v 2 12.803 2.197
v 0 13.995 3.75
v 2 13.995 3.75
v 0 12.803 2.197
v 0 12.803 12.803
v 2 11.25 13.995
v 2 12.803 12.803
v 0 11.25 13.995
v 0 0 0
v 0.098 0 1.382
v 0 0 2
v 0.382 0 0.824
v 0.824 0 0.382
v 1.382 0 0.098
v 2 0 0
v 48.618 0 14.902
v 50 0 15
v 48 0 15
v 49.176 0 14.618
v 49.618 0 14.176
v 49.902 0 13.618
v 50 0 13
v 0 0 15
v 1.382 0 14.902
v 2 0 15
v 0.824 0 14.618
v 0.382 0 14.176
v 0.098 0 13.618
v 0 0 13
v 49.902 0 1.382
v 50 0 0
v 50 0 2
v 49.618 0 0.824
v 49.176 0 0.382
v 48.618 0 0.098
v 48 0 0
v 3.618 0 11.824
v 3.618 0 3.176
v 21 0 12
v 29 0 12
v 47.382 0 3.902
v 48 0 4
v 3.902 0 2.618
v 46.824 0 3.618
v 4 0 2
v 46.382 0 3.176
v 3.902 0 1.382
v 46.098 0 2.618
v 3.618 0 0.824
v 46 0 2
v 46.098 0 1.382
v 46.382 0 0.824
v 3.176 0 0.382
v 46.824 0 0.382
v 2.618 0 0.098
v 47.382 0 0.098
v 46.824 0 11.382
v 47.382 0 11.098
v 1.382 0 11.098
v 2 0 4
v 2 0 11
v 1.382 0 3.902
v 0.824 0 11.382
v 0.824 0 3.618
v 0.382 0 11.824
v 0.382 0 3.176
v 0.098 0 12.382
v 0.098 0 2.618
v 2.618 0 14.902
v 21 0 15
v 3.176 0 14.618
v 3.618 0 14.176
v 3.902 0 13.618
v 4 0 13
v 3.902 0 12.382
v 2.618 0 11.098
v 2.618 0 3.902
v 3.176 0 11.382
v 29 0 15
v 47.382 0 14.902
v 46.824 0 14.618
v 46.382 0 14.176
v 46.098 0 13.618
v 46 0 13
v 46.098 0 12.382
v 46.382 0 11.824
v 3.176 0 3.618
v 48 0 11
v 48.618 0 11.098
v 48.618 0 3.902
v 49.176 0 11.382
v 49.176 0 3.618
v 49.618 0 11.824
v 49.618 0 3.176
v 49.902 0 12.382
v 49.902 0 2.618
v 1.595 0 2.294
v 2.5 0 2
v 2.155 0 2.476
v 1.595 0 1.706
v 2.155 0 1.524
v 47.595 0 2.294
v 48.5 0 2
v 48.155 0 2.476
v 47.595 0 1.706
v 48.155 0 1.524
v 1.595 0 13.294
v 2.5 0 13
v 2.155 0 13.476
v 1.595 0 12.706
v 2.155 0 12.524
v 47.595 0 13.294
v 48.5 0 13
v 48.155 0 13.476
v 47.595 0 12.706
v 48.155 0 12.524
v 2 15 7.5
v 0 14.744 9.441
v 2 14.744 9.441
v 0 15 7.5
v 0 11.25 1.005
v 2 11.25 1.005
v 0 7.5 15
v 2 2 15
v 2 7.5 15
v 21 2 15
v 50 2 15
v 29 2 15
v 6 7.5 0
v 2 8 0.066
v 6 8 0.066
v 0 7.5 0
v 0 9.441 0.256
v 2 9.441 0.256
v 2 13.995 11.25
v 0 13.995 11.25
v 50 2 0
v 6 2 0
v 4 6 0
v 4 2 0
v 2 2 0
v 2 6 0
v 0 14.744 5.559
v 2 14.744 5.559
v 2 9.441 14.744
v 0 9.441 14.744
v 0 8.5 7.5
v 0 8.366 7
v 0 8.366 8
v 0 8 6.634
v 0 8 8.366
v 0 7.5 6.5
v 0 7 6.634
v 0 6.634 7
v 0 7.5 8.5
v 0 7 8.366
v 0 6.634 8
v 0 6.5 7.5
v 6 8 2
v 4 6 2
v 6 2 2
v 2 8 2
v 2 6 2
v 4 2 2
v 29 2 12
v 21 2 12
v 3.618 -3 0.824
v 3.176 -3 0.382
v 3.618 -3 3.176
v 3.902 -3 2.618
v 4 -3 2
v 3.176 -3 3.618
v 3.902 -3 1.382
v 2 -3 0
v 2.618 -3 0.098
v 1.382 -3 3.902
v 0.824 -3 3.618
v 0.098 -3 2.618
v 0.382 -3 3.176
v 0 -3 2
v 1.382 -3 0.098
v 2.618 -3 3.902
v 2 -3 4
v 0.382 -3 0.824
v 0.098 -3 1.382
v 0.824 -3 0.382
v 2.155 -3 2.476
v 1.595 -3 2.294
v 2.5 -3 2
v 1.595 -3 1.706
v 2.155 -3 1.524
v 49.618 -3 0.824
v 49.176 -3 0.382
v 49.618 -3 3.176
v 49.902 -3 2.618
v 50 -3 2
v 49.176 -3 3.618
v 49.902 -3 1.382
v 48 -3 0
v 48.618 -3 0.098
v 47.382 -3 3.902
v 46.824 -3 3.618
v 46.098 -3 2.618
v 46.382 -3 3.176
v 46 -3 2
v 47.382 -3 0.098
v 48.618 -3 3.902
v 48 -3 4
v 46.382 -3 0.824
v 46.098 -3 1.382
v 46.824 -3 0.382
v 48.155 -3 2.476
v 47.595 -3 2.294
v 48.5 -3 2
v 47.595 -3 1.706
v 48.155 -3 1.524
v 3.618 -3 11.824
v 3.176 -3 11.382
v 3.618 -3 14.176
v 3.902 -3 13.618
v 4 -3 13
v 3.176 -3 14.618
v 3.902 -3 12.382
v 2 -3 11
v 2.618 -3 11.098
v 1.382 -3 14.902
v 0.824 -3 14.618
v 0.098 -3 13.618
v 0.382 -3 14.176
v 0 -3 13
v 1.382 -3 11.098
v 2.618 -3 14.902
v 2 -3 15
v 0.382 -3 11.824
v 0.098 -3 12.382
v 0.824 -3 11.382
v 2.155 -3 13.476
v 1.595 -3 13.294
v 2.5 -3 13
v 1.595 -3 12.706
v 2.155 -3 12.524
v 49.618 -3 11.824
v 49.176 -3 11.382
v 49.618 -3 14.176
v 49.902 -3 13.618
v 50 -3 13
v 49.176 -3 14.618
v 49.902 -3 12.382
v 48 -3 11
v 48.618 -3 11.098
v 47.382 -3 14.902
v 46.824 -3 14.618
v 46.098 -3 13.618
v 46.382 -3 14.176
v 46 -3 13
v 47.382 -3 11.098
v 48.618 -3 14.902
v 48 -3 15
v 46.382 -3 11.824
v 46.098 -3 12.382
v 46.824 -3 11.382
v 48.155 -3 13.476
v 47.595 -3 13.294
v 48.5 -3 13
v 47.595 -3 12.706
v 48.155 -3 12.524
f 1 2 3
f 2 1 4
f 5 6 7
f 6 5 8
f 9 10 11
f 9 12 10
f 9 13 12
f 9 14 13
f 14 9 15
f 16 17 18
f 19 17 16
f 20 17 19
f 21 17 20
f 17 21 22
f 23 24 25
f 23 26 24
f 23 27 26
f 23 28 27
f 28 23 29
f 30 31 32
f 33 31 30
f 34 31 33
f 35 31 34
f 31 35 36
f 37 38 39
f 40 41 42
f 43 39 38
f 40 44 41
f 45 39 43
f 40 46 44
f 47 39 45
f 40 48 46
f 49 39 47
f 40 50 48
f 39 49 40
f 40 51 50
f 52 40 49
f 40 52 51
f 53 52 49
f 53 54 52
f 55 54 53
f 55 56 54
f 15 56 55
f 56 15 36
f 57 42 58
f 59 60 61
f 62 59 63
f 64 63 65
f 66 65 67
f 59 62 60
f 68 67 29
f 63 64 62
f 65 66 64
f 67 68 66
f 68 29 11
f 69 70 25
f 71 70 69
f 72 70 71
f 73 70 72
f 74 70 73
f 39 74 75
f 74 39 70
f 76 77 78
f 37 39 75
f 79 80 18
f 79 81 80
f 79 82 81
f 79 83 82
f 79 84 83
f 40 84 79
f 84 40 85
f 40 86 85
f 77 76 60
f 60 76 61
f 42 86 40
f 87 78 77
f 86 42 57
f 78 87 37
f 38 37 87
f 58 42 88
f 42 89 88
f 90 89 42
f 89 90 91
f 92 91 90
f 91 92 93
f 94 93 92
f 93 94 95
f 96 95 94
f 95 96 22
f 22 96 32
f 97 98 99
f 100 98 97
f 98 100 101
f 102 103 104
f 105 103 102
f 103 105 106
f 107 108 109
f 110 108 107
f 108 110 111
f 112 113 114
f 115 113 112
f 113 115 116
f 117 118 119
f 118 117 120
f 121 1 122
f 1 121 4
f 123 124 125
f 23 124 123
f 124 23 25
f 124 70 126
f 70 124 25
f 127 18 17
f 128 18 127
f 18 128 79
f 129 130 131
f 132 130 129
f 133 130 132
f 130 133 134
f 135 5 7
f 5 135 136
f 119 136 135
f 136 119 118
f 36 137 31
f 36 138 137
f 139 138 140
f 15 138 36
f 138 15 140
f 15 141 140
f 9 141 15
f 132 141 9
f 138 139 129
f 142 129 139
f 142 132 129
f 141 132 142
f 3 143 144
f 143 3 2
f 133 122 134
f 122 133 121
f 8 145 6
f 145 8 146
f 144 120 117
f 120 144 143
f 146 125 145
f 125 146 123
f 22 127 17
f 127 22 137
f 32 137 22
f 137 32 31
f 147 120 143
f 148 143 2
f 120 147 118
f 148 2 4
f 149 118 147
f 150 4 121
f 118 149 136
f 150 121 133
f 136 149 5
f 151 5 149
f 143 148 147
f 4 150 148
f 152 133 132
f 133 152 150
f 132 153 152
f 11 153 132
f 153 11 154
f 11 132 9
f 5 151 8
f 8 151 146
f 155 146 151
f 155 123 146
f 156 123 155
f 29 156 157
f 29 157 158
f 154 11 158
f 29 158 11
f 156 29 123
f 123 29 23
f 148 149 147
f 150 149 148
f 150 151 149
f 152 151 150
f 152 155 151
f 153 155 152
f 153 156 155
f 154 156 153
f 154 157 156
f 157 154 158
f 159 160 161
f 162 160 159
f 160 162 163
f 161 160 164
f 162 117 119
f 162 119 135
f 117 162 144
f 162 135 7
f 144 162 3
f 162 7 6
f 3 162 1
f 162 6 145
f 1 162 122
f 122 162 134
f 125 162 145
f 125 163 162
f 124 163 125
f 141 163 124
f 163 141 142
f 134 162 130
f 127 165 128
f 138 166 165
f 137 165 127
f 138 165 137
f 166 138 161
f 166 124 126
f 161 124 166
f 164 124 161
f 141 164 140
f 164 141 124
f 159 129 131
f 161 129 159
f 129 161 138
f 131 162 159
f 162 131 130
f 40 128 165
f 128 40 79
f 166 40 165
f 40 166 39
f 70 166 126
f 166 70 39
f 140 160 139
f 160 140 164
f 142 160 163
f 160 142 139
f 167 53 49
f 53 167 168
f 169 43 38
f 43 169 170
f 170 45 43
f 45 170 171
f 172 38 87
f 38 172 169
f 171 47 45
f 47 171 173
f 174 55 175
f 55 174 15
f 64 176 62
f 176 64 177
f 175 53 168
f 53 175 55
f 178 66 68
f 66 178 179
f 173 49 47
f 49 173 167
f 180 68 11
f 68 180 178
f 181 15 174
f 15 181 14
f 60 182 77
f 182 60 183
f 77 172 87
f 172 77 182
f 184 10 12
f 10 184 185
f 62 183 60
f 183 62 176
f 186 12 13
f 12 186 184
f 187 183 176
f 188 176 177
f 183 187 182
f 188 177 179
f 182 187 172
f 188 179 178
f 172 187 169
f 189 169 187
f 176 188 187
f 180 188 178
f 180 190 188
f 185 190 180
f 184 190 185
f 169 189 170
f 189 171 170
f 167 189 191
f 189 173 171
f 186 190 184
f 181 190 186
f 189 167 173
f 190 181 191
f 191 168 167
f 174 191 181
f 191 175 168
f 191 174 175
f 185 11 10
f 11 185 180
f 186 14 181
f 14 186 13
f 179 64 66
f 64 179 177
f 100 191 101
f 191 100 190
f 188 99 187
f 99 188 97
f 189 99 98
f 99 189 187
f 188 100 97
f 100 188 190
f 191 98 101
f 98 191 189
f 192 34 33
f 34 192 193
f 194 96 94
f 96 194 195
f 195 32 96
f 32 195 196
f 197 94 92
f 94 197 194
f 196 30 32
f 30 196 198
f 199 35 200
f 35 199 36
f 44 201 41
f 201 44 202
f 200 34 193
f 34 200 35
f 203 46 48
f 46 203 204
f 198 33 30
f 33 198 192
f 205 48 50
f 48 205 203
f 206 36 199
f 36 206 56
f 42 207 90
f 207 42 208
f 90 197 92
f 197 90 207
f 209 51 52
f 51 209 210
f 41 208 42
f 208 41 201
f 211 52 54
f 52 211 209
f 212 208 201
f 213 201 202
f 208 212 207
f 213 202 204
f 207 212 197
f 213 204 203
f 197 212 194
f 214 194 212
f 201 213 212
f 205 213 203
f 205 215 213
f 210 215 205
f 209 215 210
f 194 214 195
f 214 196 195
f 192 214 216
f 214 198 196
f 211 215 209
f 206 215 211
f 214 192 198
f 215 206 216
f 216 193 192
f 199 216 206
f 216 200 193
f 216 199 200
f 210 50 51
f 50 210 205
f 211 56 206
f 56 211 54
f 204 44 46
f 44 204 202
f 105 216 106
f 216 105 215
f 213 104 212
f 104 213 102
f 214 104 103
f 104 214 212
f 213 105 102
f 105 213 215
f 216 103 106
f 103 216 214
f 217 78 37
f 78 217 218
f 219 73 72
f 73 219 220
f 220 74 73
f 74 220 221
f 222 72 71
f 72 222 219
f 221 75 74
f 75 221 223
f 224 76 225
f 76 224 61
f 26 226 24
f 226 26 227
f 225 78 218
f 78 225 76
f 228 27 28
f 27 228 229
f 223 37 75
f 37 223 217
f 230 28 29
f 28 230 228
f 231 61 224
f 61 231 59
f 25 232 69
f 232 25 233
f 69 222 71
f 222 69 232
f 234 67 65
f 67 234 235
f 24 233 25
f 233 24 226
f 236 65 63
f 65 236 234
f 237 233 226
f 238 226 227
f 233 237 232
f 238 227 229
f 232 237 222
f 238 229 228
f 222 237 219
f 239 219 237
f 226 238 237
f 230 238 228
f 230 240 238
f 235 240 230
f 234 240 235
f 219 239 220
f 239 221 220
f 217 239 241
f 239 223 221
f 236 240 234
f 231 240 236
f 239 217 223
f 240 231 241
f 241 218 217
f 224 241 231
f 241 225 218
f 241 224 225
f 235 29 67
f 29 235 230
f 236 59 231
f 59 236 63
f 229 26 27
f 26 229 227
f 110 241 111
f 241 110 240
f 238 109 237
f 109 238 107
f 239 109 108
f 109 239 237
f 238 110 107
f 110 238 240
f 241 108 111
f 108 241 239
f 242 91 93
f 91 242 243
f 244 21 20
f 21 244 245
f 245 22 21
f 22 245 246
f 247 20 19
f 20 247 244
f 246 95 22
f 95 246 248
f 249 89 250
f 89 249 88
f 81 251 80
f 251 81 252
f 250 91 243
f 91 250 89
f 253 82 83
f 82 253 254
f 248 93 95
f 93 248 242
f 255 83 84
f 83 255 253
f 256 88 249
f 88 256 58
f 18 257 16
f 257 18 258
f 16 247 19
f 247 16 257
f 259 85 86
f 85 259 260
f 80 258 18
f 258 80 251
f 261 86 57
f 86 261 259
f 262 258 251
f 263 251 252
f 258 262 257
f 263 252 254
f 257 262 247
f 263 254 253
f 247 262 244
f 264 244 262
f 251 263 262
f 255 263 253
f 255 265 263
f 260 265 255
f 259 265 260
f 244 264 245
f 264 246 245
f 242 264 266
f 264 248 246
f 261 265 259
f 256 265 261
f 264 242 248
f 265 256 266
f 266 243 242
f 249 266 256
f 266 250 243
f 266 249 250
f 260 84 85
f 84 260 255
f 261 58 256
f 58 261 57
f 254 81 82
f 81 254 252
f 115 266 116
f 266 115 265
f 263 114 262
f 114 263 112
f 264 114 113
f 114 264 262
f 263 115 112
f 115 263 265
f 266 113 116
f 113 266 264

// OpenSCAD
h_bracket = 15;
l_bracket = 50;
r = h_bracket/2;
r_clearance = 1;
r_pilot = r_clearance/2;
r_standoff = r_pilot*4;

dx_standoff = 2;
dz_standoff = 2;

hole_offset = 2;
h_notch = 3;
w_notch = 8;
thickness = 2;

union() {
  difference() {
    hull() {
      cube([l_bracket, r, r*2]);
      translate([0, r, r]) {
        rotate([0, 90, 0]) {
          cylinder(l_bracket, r = r);
        }
      }
    }
    translate([thickness, thickness, thickness]) {
      cube([l_bracket, r*2, r*2]);
    }
    translate([thickness*3, thickness, -r]) {
      cube([l_bracket, r*2, r*2]);
    }
    translate([thickness, thickness*4, -r]) {
      cube([l_bracket, r*2, r*2]);
    }
    translate([-thickness, r, r]) {
      rotate([0, 90, 0]) {
        cylinder(thickness, r = r_clearance, $fn = 12);
      }
    }
    translate([l_bracket/2, thickness/2, h_bracket]) {
      cube([w_notch, thickness*2, h_notch*2], center = true);
    }
    translate([thickness, thickness, -thickness/2]) {
      cube([thickness, thickness*2, thickness*2]);
    }
  }
  translate([dx_standoff, thickness/2, dz_standoff]) {
    standoff();
  }
  translate([l_bracket-dx_standoff, thickness/2, dz_standoff]) {
    standoff();
  }
  translate([dx_standoff, thickness/2, h_bracket-dz_standoff]) {
    standoff();
  }
  translate([l_bracket-dx_standoff, thickness/2, h_bracket-dz_standoff]) {
    standoff();
  }
}

module standoff() {
  rotate([90, 0, 0]) {
    difference() {
      cylinder(1.5*r_standoff+thickness/2, r = r_standoff, $fn = 20);
      translate([0, 0, -1.5*r_standoff]) {
        cylinder(3*r_standoff+thickness/2, r = r_pilot);
      }
    }
  }
}
